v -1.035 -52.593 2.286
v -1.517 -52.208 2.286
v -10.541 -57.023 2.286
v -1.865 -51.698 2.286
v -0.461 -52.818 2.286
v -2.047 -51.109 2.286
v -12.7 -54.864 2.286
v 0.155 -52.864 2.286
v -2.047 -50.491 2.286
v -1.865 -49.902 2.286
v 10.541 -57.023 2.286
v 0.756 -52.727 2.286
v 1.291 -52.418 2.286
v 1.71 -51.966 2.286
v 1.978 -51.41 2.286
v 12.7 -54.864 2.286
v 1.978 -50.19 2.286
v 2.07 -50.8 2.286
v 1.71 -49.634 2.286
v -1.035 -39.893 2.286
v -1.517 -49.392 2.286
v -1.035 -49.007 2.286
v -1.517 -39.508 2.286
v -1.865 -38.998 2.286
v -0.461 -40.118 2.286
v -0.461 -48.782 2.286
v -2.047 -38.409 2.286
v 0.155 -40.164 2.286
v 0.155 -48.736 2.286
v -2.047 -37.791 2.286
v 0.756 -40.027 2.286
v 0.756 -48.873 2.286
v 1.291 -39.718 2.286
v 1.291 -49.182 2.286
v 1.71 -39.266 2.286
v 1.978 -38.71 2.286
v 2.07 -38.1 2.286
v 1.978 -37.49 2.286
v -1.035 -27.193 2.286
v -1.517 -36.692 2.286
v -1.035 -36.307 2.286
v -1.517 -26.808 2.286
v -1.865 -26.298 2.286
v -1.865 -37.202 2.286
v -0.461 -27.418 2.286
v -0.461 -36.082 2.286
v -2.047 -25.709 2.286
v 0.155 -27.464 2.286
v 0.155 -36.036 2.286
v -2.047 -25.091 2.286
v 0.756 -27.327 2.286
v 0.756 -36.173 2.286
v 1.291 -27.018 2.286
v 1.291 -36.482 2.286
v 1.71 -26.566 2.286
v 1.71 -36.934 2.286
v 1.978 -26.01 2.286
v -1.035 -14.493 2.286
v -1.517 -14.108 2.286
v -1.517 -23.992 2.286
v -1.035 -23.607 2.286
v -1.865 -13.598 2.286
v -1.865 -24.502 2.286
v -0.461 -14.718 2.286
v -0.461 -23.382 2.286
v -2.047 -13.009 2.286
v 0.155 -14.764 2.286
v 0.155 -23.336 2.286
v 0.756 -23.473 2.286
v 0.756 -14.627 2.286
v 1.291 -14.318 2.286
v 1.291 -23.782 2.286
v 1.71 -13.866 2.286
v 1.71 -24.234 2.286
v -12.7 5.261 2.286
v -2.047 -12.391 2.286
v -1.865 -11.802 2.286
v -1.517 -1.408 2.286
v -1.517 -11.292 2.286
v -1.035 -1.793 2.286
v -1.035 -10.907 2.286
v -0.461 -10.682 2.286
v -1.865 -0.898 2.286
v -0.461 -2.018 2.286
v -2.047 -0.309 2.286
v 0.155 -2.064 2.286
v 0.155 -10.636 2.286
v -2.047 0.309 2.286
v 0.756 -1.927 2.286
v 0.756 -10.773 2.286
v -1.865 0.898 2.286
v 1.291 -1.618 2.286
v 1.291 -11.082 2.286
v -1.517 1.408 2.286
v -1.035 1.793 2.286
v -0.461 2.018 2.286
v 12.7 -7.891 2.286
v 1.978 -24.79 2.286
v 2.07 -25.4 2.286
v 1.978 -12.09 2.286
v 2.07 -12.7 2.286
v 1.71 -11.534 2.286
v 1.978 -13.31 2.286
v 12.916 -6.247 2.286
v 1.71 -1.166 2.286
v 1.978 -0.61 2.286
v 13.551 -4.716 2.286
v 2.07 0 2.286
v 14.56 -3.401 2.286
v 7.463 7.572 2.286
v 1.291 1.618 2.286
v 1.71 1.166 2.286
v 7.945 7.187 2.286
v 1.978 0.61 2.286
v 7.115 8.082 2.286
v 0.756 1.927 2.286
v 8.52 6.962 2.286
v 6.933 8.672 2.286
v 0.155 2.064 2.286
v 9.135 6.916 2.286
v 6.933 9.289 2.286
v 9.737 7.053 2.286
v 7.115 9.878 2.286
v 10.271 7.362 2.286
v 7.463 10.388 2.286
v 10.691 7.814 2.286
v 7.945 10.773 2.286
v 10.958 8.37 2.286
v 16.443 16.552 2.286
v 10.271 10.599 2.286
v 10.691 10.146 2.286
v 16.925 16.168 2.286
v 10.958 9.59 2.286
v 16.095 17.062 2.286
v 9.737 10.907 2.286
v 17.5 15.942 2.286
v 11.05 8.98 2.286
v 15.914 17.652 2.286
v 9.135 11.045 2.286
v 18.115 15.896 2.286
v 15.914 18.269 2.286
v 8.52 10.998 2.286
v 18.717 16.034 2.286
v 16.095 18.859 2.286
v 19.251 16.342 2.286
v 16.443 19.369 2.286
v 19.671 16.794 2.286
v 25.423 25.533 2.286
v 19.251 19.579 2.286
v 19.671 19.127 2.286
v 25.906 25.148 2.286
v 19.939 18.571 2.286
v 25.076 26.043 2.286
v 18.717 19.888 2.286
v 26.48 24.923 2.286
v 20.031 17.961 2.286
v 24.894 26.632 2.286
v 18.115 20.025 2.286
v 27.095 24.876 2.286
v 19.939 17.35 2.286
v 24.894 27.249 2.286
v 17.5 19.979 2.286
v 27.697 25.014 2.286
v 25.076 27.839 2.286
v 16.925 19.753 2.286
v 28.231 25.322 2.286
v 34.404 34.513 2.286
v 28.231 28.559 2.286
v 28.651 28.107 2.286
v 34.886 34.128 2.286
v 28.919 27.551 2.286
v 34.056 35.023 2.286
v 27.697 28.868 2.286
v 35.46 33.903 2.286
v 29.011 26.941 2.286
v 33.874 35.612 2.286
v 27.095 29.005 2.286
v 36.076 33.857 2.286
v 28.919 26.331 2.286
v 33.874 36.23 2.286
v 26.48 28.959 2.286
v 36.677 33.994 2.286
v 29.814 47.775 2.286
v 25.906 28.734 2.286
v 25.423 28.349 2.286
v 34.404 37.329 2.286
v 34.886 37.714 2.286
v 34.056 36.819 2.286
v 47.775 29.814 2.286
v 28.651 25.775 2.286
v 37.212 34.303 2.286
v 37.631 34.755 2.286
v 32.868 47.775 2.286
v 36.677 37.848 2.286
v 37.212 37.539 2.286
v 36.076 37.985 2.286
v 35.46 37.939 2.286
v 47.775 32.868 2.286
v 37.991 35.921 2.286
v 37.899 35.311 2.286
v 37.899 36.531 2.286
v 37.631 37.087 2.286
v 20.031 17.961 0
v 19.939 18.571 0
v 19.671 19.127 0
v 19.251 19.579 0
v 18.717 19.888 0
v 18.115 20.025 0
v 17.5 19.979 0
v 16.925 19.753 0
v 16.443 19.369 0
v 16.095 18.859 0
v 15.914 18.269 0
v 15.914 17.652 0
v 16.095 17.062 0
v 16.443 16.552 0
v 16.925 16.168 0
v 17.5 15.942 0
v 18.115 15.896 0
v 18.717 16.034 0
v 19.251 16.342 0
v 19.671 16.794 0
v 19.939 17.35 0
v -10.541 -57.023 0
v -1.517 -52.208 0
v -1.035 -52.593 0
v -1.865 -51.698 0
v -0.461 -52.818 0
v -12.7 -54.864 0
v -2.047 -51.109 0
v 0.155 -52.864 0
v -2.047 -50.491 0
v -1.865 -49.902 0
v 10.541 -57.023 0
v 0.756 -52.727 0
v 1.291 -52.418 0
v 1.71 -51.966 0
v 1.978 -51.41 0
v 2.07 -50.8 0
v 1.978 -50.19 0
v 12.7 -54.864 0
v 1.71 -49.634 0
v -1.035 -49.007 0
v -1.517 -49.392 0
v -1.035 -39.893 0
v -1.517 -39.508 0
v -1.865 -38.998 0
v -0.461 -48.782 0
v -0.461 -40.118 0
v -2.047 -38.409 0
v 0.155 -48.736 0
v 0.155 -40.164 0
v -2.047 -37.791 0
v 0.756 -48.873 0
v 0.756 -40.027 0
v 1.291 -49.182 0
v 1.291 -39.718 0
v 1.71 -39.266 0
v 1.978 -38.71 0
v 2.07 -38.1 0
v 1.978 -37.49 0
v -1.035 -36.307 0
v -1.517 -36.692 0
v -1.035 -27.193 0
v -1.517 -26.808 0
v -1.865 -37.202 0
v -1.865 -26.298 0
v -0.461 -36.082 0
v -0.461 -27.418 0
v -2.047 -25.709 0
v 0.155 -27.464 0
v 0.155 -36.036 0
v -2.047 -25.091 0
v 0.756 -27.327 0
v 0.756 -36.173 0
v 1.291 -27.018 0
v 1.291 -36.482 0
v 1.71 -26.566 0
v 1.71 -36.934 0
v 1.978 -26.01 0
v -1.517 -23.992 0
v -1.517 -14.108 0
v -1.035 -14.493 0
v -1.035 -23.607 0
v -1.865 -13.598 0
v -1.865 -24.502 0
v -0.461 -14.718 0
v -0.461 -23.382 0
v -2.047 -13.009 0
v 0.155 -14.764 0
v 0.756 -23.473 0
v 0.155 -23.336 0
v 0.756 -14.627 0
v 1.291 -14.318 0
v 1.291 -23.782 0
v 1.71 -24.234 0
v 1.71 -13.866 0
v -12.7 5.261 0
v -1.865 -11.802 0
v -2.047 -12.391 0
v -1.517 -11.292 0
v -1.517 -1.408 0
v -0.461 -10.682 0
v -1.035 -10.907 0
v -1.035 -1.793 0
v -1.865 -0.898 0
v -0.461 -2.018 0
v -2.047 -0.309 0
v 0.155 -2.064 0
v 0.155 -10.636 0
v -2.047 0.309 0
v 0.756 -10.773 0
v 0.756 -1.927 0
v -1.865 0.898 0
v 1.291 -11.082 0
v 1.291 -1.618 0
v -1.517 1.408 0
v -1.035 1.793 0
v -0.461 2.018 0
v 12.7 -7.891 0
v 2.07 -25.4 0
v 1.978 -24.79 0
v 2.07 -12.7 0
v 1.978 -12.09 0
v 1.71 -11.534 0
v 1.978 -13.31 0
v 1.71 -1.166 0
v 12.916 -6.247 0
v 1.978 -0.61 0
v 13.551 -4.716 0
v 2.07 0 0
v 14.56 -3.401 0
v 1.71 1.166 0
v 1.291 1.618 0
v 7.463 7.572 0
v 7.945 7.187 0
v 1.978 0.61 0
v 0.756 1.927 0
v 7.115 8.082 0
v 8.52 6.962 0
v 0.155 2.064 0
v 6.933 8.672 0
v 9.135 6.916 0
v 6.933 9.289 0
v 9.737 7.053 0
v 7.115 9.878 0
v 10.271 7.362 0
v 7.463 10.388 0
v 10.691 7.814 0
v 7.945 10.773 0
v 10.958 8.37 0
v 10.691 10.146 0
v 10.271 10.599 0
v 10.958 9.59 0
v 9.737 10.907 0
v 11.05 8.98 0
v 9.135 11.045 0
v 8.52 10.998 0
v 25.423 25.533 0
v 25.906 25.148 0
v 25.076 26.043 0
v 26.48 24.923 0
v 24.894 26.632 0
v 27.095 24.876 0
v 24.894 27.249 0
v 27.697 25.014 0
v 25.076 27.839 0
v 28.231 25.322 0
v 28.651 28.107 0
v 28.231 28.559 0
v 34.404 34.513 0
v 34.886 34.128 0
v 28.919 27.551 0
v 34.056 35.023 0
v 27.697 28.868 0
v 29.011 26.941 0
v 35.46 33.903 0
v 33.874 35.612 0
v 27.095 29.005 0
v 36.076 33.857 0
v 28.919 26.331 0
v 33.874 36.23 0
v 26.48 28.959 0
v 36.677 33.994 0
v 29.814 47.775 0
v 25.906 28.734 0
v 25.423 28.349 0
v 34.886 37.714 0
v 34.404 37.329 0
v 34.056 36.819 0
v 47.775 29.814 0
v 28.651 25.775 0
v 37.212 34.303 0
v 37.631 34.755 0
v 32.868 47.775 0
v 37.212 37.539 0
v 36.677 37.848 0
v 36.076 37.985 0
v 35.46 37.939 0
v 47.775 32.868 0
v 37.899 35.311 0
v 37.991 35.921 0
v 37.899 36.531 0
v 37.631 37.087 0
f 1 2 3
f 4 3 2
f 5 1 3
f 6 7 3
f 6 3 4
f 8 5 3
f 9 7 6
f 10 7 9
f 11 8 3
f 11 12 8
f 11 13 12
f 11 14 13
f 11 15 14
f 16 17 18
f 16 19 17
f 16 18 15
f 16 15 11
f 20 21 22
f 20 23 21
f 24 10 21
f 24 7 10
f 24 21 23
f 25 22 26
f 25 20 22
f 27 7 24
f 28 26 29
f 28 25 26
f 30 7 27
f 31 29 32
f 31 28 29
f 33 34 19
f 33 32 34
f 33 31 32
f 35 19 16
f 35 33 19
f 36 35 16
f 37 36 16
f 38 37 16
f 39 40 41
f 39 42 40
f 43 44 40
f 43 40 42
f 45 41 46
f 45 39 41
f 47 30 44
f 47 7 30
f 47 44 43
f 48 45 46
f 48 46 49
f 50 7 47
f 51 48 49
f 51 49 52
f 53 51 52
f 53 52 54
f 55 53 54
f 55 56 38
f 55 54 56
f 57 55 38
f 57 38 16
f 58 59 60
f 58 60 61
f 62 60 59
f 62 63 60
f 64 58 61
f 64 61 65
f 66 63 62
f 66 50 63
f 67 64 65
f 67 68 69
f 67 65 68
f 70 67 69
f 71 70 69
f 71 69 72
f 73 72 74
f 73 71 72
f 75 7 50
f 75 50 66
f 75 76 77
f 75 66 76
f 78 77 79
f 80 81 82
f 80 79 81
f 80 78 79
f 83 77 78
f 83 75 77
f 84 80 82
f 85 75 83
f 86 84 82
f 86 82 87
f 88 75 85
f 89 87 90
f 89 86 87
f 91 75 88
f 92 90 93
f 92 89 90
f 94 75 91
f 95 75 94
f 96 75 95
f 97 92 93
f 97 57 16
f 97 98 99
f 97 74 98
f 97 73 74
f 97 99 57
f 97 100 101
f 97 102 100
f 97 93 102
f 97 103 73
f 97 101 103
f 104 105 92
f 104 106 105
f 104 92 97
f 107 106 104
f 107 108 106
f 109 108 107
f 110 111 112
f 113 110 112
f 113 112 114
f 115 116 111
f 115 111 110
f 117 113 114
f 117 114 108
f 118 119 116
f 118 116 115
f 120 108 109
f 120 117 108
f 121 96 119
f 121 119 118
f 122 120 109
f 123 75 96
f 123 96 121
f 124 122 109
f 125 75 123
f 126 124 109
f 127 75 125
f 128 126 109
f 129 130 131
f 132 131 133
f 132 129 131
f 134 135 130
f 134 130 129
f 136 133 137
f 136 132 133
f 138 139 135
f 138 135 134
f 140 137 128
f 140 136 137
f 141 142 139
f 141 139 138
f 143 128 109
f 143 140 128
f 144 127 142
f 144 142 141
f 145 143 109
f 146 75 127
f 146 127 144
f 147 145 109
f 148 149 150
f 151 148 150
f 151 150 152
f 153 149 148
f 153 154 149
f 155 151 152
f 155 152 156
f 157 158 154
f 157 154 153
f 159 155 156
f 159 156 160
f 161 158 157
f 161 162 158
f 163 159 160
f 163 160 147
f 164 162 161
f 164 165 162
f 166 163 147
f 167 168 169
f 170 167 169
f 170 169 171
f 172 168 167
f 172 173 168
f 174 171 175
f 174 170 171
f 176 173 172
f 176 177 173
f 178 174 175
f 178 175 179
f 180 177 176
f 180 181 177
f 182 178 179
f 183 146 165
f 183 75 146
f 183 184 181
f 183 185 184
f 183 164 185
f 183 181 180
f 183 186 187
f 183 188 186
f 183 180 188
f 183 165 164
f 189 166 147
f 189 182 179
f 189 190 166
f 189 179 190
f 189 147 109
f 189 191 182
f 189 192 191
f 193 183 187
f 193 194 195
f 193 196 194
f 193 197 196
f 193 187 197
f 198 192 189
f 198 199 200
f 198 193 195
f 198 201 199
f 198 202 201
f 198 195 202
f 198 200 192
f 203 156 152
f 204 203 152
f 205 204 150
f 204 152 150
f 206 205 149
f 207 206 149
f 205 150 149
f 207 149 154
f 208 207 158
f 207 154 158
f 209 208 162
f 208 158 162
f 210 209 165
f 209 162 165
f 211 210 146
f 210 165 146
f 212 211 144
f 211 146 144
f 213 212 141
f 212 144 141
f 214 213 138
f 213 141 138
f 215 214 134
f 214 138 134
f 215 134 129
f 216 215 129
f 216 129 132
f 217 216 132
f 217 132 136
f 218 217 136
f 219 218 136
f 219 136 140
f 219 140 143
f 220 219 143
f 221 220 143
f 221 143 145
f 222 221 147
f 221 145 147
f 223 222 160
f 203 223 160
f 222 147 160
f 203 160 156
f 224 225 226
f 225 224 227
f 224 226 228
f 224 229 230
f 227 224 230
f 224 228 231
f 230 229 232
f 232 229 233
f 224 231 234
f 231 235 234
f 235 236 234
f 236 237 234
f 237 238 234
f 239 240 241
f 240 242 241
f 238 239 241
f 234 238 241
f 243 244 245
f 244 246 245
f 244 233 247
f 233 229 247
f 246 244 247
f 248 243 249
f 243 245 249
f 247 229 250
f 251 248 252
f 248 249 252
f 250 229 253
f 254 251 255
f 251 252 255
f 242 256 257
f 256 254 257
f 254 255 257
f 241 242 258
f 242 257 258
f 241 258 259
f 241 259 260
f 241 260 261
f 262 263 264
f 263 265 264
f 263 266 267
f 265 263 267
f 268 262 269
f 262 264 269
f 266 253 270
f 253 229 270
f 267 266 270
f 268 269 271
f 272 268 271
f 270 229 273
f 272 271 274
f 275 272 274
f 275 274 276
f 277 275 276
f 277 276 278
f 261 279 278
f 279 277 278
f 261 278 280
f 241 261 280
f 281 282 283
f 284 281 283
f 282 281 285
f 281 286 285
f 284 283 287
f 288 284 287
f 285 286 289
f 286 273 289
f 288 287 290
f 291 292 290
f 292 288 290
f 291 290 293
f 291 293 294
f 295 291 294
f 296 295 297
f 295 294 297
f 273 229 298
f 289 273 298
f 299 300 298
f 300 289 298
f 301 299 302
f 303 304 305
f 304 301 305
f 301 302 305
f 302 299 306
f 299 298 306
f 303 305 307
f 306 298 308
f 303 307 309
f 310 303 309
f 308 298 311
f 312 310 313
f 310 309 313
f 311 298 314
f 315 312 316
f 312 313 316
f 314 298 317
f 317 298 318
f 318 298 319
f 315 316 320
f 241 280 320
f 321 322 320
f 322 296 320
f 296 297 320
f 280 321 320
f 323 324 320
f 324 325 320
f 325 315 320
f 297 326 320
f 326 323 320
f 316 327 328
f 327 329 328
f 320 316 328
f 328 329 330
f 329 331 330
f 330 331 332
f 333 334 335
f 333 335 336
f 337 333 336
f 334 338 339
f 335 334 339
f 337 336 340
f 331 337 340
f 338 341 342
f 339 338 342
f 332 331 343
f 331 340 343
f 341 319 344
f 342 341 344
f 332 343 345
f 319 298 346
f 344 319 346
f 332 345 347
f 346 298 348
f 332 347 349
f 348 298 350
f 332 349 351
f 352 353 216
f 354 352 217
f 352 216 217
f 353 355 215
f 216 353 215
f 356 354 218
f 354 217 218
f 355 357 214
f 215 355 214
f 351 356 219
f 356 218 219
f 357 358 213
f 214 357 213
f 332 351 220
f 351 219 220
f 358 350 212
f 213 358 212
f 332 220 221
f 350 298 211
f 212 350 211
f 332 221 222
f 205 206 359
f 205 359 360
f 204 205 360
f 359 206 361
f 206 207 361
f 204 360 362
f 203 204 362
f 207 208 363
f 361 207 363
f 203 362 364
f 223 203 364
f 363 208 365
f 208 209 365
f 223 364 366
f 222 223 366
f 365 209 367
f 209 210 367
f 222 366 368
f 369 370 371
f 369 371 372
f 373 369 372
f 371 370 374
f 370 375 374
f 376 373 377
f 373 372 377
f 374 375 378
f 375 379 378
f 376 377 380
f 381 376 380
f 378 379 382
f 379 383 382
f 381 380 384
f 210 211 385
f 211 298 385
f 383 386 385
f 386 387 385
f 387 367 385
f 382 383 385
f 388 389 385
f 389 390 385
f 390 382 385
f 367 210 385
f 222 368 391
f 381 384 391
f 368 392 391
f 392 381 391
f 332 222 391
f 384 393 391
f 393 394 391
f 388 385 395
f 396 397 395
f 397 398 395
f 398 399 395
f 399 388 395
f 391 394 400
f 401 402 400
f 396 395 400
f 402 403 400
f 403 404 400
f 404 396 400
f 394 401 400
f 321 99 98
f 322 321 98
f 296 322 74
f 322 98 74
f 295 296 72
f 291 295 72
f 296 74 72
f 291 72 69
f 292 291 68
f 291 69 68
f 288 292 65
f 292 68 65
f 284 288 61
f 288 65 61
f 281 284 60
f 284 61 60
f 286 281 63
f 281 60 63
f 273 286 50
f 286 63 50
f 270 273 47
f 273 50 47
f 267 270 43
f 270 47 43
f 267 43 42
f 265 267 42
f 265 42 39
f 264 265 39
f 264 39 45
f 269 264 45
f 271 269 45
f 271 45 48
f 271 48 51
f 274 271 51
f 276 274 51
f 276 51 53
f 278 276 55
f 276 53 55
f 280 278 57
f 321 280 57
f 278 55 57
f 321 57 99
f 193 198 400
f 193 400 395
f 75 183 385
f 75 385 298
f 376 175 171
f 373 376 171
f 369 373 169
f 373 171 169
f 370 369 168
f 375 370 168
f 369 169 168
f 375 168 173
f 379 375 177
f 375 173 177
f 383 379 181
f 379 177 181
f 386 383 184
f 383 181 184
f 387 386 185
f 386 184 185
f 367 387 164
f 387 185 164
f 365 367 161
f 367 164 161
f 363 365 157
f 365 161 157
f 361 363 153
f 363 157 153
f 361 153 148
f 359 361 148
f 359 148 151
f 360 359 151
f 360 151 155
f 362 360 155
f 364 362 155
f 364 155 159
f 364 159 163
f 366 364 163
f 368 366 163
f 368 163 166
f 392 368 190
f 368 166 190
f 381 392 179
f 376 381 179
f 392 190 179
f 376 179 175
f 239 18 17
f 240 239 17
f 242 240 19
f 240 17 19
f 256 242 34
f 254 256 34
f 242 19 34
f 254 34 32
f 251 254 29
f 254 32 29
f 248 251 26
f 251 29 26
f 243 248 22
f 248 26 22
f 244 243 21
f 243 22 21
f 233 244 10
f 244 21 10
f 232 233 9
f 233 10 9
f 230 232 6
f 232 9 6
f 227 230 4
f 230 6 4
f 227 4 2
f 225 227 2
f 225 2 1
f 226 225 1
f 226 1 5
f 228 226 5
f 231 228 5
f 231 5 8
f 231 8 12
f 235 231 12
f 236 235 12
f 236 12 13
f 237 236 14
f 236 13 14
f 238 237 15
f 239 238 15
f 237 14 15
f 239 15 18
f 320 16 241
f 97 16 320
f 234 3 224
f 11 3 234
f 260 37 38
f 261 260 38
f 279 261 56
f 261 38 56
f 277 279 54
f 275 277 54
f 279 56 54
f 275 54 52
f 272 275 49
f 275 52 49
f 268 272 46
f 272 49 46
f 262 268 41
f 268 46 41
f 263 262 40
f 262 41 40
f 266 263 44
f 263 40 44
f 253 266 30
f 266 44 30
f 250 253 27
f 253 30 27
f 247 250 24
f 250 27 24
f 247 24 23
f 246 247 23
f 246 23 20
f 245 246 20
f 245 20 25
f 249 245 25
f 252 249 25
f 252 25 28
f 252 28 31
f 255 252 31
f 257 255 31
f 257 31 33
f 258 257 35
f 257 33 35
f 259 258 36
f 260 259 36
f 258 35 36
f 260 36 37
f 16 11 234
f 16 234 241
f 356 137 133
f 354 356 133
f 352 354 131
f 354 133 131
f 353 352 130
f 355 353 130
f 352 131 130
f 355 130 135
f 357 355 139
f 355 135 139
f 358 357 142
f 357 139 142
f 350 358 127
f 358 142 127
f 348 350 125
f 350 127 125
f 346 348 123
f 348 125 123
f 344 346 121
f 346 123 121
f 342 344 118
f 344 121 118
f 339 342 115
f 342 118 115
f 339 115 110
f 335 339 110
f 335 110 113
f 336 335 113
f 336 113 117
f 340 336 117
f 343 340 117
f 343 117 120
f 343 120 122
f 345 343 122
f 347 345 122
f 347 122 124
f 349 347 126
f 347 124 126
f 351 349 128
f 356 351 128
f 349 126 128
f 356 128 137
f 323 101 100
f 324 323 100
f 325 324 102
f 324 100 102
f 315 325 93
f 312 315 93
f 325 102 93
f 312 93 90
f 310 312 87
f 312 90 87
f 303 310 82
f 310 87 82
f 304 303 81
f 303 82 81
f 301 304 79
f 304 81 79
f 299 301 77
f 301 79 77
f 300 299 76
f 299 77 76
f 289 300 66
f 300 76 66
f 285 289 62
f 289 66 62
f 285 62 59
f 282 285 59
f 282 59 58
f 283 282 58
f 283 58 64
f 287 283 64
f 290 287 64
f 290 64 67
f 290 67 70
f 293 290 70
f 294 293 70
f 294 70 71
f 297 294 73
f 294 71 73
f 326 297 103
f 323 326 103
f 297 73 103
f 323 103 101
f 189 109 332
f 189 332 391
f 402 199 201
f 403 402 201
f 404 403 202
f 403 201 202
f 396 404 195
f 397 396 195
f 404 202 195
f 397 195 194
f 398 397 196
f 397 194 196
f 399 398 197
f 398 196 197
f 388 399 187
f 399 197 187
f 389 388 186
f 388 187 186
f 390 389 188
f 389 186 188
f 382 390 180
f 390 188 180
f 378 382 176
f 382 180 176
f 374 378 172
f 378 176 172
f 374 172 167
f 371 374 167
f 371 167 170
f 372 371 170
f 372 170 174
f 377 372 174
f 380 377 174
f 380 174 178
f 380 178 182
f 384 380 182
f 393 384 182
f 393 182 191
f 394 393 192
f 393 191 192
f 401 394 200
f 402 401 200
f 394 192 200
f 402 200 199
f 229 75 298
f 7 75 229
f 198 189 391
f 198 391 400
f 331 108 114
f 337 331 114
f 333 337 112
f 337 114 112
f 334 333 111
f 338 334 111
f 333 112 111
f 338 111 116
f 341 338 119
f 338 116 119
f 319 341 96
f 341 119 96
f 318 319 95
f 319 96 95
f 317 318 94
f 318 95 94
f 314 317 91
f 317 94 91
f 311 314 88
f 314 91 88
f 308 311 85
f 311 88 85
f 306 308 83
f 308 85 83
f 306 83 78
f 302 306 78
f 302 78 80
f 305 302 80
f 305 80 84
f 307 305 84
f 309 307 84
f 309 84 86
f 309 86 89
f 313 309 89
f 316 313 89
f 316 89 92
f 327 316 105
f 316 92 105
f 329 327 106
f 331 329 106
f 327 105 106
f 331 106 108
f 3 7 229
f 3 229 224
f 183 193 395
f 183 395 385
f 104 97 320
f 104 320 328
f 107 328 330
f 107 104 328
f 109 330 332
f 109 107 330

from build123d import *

# Parameters (mm, degrees)
SKETCH1_R           = 2.0701
BOSS_EXTRUDE1_DEPTH = 2.286


with BuildPart() as part:
    # Sketch1 → Boss-Extrude1 (new body)
    with BuildSketch(Plane.XY.offset(2.286)):
        with BuildLine():
            Line((32.867737403, 47.774962564), (29.814450322, 47.774962564))
            Line((29.814450322, 47.774962564), (-12.7, 5.260512242))
            Line((-12.7, 5.260512242), (-12.7, -54.864))
            Line((-12.7, -54.864), (-10.541, -57.023))
            Line((-10.541, -57.023), (10.541, -57.023))
            Line((10.541, -57.023), (12.7, -54.864))
            Line((12.7, -54.864), (12.7, -7.890768363))
            ThreePointArc((12.7, -7.890768363), (13.183364969, -5.460728568), (14.559871939, -3.400640303))
            Line((14.559871939, -3.400640303), (47.774962564, 29.814450322))
            Line((47.774962564, 29.814450322), (47.774962564, 32.867737403))
            Line((47.774962564, 32.867737403), (32.867737403, 47.774962564))
        make_face()
        with Locations((35.921024484, 35.921024484)):
            Circle(SKETCH1_R, mode=Mode.SUBTRACT)
        with Locations((17.960512242, 17.960512242)):
            Circle(SKETCH1_R, mode=Mode.SUBTRACT)
        with Locations((8.980256121, 8.980256121)):
            Circle(SKETCH1_R, mode=Mode.SUBTRACT)
        with Locations((26.940768363, 26.940768363)):
            Circle(SKETCH1_R, mode=Mode.SUBTRACT)
        with Locations((0, -50.8)):
            Circle(SKETCH1_R, mode=Mode.SUBTRACT)
        with Locations((0, -25.4)):
            Circle(SKETCH1_R, mode=Mode.SUBTRACT)
        with Locations((0, -12.7)):
            Circle(SKETCH1_R, mode=Mode.SUBTRACT)
        with Locations((0, -38.1)):
            Circle(SKETCH1_R, mode=Mode.SUBTRACT)
        Circle(SKETCH1_R, mode=Mode.SUBTRACT)
    extrude(amount=-BOSS_EXTRUDE1_DEPTH)


solid = part.part
